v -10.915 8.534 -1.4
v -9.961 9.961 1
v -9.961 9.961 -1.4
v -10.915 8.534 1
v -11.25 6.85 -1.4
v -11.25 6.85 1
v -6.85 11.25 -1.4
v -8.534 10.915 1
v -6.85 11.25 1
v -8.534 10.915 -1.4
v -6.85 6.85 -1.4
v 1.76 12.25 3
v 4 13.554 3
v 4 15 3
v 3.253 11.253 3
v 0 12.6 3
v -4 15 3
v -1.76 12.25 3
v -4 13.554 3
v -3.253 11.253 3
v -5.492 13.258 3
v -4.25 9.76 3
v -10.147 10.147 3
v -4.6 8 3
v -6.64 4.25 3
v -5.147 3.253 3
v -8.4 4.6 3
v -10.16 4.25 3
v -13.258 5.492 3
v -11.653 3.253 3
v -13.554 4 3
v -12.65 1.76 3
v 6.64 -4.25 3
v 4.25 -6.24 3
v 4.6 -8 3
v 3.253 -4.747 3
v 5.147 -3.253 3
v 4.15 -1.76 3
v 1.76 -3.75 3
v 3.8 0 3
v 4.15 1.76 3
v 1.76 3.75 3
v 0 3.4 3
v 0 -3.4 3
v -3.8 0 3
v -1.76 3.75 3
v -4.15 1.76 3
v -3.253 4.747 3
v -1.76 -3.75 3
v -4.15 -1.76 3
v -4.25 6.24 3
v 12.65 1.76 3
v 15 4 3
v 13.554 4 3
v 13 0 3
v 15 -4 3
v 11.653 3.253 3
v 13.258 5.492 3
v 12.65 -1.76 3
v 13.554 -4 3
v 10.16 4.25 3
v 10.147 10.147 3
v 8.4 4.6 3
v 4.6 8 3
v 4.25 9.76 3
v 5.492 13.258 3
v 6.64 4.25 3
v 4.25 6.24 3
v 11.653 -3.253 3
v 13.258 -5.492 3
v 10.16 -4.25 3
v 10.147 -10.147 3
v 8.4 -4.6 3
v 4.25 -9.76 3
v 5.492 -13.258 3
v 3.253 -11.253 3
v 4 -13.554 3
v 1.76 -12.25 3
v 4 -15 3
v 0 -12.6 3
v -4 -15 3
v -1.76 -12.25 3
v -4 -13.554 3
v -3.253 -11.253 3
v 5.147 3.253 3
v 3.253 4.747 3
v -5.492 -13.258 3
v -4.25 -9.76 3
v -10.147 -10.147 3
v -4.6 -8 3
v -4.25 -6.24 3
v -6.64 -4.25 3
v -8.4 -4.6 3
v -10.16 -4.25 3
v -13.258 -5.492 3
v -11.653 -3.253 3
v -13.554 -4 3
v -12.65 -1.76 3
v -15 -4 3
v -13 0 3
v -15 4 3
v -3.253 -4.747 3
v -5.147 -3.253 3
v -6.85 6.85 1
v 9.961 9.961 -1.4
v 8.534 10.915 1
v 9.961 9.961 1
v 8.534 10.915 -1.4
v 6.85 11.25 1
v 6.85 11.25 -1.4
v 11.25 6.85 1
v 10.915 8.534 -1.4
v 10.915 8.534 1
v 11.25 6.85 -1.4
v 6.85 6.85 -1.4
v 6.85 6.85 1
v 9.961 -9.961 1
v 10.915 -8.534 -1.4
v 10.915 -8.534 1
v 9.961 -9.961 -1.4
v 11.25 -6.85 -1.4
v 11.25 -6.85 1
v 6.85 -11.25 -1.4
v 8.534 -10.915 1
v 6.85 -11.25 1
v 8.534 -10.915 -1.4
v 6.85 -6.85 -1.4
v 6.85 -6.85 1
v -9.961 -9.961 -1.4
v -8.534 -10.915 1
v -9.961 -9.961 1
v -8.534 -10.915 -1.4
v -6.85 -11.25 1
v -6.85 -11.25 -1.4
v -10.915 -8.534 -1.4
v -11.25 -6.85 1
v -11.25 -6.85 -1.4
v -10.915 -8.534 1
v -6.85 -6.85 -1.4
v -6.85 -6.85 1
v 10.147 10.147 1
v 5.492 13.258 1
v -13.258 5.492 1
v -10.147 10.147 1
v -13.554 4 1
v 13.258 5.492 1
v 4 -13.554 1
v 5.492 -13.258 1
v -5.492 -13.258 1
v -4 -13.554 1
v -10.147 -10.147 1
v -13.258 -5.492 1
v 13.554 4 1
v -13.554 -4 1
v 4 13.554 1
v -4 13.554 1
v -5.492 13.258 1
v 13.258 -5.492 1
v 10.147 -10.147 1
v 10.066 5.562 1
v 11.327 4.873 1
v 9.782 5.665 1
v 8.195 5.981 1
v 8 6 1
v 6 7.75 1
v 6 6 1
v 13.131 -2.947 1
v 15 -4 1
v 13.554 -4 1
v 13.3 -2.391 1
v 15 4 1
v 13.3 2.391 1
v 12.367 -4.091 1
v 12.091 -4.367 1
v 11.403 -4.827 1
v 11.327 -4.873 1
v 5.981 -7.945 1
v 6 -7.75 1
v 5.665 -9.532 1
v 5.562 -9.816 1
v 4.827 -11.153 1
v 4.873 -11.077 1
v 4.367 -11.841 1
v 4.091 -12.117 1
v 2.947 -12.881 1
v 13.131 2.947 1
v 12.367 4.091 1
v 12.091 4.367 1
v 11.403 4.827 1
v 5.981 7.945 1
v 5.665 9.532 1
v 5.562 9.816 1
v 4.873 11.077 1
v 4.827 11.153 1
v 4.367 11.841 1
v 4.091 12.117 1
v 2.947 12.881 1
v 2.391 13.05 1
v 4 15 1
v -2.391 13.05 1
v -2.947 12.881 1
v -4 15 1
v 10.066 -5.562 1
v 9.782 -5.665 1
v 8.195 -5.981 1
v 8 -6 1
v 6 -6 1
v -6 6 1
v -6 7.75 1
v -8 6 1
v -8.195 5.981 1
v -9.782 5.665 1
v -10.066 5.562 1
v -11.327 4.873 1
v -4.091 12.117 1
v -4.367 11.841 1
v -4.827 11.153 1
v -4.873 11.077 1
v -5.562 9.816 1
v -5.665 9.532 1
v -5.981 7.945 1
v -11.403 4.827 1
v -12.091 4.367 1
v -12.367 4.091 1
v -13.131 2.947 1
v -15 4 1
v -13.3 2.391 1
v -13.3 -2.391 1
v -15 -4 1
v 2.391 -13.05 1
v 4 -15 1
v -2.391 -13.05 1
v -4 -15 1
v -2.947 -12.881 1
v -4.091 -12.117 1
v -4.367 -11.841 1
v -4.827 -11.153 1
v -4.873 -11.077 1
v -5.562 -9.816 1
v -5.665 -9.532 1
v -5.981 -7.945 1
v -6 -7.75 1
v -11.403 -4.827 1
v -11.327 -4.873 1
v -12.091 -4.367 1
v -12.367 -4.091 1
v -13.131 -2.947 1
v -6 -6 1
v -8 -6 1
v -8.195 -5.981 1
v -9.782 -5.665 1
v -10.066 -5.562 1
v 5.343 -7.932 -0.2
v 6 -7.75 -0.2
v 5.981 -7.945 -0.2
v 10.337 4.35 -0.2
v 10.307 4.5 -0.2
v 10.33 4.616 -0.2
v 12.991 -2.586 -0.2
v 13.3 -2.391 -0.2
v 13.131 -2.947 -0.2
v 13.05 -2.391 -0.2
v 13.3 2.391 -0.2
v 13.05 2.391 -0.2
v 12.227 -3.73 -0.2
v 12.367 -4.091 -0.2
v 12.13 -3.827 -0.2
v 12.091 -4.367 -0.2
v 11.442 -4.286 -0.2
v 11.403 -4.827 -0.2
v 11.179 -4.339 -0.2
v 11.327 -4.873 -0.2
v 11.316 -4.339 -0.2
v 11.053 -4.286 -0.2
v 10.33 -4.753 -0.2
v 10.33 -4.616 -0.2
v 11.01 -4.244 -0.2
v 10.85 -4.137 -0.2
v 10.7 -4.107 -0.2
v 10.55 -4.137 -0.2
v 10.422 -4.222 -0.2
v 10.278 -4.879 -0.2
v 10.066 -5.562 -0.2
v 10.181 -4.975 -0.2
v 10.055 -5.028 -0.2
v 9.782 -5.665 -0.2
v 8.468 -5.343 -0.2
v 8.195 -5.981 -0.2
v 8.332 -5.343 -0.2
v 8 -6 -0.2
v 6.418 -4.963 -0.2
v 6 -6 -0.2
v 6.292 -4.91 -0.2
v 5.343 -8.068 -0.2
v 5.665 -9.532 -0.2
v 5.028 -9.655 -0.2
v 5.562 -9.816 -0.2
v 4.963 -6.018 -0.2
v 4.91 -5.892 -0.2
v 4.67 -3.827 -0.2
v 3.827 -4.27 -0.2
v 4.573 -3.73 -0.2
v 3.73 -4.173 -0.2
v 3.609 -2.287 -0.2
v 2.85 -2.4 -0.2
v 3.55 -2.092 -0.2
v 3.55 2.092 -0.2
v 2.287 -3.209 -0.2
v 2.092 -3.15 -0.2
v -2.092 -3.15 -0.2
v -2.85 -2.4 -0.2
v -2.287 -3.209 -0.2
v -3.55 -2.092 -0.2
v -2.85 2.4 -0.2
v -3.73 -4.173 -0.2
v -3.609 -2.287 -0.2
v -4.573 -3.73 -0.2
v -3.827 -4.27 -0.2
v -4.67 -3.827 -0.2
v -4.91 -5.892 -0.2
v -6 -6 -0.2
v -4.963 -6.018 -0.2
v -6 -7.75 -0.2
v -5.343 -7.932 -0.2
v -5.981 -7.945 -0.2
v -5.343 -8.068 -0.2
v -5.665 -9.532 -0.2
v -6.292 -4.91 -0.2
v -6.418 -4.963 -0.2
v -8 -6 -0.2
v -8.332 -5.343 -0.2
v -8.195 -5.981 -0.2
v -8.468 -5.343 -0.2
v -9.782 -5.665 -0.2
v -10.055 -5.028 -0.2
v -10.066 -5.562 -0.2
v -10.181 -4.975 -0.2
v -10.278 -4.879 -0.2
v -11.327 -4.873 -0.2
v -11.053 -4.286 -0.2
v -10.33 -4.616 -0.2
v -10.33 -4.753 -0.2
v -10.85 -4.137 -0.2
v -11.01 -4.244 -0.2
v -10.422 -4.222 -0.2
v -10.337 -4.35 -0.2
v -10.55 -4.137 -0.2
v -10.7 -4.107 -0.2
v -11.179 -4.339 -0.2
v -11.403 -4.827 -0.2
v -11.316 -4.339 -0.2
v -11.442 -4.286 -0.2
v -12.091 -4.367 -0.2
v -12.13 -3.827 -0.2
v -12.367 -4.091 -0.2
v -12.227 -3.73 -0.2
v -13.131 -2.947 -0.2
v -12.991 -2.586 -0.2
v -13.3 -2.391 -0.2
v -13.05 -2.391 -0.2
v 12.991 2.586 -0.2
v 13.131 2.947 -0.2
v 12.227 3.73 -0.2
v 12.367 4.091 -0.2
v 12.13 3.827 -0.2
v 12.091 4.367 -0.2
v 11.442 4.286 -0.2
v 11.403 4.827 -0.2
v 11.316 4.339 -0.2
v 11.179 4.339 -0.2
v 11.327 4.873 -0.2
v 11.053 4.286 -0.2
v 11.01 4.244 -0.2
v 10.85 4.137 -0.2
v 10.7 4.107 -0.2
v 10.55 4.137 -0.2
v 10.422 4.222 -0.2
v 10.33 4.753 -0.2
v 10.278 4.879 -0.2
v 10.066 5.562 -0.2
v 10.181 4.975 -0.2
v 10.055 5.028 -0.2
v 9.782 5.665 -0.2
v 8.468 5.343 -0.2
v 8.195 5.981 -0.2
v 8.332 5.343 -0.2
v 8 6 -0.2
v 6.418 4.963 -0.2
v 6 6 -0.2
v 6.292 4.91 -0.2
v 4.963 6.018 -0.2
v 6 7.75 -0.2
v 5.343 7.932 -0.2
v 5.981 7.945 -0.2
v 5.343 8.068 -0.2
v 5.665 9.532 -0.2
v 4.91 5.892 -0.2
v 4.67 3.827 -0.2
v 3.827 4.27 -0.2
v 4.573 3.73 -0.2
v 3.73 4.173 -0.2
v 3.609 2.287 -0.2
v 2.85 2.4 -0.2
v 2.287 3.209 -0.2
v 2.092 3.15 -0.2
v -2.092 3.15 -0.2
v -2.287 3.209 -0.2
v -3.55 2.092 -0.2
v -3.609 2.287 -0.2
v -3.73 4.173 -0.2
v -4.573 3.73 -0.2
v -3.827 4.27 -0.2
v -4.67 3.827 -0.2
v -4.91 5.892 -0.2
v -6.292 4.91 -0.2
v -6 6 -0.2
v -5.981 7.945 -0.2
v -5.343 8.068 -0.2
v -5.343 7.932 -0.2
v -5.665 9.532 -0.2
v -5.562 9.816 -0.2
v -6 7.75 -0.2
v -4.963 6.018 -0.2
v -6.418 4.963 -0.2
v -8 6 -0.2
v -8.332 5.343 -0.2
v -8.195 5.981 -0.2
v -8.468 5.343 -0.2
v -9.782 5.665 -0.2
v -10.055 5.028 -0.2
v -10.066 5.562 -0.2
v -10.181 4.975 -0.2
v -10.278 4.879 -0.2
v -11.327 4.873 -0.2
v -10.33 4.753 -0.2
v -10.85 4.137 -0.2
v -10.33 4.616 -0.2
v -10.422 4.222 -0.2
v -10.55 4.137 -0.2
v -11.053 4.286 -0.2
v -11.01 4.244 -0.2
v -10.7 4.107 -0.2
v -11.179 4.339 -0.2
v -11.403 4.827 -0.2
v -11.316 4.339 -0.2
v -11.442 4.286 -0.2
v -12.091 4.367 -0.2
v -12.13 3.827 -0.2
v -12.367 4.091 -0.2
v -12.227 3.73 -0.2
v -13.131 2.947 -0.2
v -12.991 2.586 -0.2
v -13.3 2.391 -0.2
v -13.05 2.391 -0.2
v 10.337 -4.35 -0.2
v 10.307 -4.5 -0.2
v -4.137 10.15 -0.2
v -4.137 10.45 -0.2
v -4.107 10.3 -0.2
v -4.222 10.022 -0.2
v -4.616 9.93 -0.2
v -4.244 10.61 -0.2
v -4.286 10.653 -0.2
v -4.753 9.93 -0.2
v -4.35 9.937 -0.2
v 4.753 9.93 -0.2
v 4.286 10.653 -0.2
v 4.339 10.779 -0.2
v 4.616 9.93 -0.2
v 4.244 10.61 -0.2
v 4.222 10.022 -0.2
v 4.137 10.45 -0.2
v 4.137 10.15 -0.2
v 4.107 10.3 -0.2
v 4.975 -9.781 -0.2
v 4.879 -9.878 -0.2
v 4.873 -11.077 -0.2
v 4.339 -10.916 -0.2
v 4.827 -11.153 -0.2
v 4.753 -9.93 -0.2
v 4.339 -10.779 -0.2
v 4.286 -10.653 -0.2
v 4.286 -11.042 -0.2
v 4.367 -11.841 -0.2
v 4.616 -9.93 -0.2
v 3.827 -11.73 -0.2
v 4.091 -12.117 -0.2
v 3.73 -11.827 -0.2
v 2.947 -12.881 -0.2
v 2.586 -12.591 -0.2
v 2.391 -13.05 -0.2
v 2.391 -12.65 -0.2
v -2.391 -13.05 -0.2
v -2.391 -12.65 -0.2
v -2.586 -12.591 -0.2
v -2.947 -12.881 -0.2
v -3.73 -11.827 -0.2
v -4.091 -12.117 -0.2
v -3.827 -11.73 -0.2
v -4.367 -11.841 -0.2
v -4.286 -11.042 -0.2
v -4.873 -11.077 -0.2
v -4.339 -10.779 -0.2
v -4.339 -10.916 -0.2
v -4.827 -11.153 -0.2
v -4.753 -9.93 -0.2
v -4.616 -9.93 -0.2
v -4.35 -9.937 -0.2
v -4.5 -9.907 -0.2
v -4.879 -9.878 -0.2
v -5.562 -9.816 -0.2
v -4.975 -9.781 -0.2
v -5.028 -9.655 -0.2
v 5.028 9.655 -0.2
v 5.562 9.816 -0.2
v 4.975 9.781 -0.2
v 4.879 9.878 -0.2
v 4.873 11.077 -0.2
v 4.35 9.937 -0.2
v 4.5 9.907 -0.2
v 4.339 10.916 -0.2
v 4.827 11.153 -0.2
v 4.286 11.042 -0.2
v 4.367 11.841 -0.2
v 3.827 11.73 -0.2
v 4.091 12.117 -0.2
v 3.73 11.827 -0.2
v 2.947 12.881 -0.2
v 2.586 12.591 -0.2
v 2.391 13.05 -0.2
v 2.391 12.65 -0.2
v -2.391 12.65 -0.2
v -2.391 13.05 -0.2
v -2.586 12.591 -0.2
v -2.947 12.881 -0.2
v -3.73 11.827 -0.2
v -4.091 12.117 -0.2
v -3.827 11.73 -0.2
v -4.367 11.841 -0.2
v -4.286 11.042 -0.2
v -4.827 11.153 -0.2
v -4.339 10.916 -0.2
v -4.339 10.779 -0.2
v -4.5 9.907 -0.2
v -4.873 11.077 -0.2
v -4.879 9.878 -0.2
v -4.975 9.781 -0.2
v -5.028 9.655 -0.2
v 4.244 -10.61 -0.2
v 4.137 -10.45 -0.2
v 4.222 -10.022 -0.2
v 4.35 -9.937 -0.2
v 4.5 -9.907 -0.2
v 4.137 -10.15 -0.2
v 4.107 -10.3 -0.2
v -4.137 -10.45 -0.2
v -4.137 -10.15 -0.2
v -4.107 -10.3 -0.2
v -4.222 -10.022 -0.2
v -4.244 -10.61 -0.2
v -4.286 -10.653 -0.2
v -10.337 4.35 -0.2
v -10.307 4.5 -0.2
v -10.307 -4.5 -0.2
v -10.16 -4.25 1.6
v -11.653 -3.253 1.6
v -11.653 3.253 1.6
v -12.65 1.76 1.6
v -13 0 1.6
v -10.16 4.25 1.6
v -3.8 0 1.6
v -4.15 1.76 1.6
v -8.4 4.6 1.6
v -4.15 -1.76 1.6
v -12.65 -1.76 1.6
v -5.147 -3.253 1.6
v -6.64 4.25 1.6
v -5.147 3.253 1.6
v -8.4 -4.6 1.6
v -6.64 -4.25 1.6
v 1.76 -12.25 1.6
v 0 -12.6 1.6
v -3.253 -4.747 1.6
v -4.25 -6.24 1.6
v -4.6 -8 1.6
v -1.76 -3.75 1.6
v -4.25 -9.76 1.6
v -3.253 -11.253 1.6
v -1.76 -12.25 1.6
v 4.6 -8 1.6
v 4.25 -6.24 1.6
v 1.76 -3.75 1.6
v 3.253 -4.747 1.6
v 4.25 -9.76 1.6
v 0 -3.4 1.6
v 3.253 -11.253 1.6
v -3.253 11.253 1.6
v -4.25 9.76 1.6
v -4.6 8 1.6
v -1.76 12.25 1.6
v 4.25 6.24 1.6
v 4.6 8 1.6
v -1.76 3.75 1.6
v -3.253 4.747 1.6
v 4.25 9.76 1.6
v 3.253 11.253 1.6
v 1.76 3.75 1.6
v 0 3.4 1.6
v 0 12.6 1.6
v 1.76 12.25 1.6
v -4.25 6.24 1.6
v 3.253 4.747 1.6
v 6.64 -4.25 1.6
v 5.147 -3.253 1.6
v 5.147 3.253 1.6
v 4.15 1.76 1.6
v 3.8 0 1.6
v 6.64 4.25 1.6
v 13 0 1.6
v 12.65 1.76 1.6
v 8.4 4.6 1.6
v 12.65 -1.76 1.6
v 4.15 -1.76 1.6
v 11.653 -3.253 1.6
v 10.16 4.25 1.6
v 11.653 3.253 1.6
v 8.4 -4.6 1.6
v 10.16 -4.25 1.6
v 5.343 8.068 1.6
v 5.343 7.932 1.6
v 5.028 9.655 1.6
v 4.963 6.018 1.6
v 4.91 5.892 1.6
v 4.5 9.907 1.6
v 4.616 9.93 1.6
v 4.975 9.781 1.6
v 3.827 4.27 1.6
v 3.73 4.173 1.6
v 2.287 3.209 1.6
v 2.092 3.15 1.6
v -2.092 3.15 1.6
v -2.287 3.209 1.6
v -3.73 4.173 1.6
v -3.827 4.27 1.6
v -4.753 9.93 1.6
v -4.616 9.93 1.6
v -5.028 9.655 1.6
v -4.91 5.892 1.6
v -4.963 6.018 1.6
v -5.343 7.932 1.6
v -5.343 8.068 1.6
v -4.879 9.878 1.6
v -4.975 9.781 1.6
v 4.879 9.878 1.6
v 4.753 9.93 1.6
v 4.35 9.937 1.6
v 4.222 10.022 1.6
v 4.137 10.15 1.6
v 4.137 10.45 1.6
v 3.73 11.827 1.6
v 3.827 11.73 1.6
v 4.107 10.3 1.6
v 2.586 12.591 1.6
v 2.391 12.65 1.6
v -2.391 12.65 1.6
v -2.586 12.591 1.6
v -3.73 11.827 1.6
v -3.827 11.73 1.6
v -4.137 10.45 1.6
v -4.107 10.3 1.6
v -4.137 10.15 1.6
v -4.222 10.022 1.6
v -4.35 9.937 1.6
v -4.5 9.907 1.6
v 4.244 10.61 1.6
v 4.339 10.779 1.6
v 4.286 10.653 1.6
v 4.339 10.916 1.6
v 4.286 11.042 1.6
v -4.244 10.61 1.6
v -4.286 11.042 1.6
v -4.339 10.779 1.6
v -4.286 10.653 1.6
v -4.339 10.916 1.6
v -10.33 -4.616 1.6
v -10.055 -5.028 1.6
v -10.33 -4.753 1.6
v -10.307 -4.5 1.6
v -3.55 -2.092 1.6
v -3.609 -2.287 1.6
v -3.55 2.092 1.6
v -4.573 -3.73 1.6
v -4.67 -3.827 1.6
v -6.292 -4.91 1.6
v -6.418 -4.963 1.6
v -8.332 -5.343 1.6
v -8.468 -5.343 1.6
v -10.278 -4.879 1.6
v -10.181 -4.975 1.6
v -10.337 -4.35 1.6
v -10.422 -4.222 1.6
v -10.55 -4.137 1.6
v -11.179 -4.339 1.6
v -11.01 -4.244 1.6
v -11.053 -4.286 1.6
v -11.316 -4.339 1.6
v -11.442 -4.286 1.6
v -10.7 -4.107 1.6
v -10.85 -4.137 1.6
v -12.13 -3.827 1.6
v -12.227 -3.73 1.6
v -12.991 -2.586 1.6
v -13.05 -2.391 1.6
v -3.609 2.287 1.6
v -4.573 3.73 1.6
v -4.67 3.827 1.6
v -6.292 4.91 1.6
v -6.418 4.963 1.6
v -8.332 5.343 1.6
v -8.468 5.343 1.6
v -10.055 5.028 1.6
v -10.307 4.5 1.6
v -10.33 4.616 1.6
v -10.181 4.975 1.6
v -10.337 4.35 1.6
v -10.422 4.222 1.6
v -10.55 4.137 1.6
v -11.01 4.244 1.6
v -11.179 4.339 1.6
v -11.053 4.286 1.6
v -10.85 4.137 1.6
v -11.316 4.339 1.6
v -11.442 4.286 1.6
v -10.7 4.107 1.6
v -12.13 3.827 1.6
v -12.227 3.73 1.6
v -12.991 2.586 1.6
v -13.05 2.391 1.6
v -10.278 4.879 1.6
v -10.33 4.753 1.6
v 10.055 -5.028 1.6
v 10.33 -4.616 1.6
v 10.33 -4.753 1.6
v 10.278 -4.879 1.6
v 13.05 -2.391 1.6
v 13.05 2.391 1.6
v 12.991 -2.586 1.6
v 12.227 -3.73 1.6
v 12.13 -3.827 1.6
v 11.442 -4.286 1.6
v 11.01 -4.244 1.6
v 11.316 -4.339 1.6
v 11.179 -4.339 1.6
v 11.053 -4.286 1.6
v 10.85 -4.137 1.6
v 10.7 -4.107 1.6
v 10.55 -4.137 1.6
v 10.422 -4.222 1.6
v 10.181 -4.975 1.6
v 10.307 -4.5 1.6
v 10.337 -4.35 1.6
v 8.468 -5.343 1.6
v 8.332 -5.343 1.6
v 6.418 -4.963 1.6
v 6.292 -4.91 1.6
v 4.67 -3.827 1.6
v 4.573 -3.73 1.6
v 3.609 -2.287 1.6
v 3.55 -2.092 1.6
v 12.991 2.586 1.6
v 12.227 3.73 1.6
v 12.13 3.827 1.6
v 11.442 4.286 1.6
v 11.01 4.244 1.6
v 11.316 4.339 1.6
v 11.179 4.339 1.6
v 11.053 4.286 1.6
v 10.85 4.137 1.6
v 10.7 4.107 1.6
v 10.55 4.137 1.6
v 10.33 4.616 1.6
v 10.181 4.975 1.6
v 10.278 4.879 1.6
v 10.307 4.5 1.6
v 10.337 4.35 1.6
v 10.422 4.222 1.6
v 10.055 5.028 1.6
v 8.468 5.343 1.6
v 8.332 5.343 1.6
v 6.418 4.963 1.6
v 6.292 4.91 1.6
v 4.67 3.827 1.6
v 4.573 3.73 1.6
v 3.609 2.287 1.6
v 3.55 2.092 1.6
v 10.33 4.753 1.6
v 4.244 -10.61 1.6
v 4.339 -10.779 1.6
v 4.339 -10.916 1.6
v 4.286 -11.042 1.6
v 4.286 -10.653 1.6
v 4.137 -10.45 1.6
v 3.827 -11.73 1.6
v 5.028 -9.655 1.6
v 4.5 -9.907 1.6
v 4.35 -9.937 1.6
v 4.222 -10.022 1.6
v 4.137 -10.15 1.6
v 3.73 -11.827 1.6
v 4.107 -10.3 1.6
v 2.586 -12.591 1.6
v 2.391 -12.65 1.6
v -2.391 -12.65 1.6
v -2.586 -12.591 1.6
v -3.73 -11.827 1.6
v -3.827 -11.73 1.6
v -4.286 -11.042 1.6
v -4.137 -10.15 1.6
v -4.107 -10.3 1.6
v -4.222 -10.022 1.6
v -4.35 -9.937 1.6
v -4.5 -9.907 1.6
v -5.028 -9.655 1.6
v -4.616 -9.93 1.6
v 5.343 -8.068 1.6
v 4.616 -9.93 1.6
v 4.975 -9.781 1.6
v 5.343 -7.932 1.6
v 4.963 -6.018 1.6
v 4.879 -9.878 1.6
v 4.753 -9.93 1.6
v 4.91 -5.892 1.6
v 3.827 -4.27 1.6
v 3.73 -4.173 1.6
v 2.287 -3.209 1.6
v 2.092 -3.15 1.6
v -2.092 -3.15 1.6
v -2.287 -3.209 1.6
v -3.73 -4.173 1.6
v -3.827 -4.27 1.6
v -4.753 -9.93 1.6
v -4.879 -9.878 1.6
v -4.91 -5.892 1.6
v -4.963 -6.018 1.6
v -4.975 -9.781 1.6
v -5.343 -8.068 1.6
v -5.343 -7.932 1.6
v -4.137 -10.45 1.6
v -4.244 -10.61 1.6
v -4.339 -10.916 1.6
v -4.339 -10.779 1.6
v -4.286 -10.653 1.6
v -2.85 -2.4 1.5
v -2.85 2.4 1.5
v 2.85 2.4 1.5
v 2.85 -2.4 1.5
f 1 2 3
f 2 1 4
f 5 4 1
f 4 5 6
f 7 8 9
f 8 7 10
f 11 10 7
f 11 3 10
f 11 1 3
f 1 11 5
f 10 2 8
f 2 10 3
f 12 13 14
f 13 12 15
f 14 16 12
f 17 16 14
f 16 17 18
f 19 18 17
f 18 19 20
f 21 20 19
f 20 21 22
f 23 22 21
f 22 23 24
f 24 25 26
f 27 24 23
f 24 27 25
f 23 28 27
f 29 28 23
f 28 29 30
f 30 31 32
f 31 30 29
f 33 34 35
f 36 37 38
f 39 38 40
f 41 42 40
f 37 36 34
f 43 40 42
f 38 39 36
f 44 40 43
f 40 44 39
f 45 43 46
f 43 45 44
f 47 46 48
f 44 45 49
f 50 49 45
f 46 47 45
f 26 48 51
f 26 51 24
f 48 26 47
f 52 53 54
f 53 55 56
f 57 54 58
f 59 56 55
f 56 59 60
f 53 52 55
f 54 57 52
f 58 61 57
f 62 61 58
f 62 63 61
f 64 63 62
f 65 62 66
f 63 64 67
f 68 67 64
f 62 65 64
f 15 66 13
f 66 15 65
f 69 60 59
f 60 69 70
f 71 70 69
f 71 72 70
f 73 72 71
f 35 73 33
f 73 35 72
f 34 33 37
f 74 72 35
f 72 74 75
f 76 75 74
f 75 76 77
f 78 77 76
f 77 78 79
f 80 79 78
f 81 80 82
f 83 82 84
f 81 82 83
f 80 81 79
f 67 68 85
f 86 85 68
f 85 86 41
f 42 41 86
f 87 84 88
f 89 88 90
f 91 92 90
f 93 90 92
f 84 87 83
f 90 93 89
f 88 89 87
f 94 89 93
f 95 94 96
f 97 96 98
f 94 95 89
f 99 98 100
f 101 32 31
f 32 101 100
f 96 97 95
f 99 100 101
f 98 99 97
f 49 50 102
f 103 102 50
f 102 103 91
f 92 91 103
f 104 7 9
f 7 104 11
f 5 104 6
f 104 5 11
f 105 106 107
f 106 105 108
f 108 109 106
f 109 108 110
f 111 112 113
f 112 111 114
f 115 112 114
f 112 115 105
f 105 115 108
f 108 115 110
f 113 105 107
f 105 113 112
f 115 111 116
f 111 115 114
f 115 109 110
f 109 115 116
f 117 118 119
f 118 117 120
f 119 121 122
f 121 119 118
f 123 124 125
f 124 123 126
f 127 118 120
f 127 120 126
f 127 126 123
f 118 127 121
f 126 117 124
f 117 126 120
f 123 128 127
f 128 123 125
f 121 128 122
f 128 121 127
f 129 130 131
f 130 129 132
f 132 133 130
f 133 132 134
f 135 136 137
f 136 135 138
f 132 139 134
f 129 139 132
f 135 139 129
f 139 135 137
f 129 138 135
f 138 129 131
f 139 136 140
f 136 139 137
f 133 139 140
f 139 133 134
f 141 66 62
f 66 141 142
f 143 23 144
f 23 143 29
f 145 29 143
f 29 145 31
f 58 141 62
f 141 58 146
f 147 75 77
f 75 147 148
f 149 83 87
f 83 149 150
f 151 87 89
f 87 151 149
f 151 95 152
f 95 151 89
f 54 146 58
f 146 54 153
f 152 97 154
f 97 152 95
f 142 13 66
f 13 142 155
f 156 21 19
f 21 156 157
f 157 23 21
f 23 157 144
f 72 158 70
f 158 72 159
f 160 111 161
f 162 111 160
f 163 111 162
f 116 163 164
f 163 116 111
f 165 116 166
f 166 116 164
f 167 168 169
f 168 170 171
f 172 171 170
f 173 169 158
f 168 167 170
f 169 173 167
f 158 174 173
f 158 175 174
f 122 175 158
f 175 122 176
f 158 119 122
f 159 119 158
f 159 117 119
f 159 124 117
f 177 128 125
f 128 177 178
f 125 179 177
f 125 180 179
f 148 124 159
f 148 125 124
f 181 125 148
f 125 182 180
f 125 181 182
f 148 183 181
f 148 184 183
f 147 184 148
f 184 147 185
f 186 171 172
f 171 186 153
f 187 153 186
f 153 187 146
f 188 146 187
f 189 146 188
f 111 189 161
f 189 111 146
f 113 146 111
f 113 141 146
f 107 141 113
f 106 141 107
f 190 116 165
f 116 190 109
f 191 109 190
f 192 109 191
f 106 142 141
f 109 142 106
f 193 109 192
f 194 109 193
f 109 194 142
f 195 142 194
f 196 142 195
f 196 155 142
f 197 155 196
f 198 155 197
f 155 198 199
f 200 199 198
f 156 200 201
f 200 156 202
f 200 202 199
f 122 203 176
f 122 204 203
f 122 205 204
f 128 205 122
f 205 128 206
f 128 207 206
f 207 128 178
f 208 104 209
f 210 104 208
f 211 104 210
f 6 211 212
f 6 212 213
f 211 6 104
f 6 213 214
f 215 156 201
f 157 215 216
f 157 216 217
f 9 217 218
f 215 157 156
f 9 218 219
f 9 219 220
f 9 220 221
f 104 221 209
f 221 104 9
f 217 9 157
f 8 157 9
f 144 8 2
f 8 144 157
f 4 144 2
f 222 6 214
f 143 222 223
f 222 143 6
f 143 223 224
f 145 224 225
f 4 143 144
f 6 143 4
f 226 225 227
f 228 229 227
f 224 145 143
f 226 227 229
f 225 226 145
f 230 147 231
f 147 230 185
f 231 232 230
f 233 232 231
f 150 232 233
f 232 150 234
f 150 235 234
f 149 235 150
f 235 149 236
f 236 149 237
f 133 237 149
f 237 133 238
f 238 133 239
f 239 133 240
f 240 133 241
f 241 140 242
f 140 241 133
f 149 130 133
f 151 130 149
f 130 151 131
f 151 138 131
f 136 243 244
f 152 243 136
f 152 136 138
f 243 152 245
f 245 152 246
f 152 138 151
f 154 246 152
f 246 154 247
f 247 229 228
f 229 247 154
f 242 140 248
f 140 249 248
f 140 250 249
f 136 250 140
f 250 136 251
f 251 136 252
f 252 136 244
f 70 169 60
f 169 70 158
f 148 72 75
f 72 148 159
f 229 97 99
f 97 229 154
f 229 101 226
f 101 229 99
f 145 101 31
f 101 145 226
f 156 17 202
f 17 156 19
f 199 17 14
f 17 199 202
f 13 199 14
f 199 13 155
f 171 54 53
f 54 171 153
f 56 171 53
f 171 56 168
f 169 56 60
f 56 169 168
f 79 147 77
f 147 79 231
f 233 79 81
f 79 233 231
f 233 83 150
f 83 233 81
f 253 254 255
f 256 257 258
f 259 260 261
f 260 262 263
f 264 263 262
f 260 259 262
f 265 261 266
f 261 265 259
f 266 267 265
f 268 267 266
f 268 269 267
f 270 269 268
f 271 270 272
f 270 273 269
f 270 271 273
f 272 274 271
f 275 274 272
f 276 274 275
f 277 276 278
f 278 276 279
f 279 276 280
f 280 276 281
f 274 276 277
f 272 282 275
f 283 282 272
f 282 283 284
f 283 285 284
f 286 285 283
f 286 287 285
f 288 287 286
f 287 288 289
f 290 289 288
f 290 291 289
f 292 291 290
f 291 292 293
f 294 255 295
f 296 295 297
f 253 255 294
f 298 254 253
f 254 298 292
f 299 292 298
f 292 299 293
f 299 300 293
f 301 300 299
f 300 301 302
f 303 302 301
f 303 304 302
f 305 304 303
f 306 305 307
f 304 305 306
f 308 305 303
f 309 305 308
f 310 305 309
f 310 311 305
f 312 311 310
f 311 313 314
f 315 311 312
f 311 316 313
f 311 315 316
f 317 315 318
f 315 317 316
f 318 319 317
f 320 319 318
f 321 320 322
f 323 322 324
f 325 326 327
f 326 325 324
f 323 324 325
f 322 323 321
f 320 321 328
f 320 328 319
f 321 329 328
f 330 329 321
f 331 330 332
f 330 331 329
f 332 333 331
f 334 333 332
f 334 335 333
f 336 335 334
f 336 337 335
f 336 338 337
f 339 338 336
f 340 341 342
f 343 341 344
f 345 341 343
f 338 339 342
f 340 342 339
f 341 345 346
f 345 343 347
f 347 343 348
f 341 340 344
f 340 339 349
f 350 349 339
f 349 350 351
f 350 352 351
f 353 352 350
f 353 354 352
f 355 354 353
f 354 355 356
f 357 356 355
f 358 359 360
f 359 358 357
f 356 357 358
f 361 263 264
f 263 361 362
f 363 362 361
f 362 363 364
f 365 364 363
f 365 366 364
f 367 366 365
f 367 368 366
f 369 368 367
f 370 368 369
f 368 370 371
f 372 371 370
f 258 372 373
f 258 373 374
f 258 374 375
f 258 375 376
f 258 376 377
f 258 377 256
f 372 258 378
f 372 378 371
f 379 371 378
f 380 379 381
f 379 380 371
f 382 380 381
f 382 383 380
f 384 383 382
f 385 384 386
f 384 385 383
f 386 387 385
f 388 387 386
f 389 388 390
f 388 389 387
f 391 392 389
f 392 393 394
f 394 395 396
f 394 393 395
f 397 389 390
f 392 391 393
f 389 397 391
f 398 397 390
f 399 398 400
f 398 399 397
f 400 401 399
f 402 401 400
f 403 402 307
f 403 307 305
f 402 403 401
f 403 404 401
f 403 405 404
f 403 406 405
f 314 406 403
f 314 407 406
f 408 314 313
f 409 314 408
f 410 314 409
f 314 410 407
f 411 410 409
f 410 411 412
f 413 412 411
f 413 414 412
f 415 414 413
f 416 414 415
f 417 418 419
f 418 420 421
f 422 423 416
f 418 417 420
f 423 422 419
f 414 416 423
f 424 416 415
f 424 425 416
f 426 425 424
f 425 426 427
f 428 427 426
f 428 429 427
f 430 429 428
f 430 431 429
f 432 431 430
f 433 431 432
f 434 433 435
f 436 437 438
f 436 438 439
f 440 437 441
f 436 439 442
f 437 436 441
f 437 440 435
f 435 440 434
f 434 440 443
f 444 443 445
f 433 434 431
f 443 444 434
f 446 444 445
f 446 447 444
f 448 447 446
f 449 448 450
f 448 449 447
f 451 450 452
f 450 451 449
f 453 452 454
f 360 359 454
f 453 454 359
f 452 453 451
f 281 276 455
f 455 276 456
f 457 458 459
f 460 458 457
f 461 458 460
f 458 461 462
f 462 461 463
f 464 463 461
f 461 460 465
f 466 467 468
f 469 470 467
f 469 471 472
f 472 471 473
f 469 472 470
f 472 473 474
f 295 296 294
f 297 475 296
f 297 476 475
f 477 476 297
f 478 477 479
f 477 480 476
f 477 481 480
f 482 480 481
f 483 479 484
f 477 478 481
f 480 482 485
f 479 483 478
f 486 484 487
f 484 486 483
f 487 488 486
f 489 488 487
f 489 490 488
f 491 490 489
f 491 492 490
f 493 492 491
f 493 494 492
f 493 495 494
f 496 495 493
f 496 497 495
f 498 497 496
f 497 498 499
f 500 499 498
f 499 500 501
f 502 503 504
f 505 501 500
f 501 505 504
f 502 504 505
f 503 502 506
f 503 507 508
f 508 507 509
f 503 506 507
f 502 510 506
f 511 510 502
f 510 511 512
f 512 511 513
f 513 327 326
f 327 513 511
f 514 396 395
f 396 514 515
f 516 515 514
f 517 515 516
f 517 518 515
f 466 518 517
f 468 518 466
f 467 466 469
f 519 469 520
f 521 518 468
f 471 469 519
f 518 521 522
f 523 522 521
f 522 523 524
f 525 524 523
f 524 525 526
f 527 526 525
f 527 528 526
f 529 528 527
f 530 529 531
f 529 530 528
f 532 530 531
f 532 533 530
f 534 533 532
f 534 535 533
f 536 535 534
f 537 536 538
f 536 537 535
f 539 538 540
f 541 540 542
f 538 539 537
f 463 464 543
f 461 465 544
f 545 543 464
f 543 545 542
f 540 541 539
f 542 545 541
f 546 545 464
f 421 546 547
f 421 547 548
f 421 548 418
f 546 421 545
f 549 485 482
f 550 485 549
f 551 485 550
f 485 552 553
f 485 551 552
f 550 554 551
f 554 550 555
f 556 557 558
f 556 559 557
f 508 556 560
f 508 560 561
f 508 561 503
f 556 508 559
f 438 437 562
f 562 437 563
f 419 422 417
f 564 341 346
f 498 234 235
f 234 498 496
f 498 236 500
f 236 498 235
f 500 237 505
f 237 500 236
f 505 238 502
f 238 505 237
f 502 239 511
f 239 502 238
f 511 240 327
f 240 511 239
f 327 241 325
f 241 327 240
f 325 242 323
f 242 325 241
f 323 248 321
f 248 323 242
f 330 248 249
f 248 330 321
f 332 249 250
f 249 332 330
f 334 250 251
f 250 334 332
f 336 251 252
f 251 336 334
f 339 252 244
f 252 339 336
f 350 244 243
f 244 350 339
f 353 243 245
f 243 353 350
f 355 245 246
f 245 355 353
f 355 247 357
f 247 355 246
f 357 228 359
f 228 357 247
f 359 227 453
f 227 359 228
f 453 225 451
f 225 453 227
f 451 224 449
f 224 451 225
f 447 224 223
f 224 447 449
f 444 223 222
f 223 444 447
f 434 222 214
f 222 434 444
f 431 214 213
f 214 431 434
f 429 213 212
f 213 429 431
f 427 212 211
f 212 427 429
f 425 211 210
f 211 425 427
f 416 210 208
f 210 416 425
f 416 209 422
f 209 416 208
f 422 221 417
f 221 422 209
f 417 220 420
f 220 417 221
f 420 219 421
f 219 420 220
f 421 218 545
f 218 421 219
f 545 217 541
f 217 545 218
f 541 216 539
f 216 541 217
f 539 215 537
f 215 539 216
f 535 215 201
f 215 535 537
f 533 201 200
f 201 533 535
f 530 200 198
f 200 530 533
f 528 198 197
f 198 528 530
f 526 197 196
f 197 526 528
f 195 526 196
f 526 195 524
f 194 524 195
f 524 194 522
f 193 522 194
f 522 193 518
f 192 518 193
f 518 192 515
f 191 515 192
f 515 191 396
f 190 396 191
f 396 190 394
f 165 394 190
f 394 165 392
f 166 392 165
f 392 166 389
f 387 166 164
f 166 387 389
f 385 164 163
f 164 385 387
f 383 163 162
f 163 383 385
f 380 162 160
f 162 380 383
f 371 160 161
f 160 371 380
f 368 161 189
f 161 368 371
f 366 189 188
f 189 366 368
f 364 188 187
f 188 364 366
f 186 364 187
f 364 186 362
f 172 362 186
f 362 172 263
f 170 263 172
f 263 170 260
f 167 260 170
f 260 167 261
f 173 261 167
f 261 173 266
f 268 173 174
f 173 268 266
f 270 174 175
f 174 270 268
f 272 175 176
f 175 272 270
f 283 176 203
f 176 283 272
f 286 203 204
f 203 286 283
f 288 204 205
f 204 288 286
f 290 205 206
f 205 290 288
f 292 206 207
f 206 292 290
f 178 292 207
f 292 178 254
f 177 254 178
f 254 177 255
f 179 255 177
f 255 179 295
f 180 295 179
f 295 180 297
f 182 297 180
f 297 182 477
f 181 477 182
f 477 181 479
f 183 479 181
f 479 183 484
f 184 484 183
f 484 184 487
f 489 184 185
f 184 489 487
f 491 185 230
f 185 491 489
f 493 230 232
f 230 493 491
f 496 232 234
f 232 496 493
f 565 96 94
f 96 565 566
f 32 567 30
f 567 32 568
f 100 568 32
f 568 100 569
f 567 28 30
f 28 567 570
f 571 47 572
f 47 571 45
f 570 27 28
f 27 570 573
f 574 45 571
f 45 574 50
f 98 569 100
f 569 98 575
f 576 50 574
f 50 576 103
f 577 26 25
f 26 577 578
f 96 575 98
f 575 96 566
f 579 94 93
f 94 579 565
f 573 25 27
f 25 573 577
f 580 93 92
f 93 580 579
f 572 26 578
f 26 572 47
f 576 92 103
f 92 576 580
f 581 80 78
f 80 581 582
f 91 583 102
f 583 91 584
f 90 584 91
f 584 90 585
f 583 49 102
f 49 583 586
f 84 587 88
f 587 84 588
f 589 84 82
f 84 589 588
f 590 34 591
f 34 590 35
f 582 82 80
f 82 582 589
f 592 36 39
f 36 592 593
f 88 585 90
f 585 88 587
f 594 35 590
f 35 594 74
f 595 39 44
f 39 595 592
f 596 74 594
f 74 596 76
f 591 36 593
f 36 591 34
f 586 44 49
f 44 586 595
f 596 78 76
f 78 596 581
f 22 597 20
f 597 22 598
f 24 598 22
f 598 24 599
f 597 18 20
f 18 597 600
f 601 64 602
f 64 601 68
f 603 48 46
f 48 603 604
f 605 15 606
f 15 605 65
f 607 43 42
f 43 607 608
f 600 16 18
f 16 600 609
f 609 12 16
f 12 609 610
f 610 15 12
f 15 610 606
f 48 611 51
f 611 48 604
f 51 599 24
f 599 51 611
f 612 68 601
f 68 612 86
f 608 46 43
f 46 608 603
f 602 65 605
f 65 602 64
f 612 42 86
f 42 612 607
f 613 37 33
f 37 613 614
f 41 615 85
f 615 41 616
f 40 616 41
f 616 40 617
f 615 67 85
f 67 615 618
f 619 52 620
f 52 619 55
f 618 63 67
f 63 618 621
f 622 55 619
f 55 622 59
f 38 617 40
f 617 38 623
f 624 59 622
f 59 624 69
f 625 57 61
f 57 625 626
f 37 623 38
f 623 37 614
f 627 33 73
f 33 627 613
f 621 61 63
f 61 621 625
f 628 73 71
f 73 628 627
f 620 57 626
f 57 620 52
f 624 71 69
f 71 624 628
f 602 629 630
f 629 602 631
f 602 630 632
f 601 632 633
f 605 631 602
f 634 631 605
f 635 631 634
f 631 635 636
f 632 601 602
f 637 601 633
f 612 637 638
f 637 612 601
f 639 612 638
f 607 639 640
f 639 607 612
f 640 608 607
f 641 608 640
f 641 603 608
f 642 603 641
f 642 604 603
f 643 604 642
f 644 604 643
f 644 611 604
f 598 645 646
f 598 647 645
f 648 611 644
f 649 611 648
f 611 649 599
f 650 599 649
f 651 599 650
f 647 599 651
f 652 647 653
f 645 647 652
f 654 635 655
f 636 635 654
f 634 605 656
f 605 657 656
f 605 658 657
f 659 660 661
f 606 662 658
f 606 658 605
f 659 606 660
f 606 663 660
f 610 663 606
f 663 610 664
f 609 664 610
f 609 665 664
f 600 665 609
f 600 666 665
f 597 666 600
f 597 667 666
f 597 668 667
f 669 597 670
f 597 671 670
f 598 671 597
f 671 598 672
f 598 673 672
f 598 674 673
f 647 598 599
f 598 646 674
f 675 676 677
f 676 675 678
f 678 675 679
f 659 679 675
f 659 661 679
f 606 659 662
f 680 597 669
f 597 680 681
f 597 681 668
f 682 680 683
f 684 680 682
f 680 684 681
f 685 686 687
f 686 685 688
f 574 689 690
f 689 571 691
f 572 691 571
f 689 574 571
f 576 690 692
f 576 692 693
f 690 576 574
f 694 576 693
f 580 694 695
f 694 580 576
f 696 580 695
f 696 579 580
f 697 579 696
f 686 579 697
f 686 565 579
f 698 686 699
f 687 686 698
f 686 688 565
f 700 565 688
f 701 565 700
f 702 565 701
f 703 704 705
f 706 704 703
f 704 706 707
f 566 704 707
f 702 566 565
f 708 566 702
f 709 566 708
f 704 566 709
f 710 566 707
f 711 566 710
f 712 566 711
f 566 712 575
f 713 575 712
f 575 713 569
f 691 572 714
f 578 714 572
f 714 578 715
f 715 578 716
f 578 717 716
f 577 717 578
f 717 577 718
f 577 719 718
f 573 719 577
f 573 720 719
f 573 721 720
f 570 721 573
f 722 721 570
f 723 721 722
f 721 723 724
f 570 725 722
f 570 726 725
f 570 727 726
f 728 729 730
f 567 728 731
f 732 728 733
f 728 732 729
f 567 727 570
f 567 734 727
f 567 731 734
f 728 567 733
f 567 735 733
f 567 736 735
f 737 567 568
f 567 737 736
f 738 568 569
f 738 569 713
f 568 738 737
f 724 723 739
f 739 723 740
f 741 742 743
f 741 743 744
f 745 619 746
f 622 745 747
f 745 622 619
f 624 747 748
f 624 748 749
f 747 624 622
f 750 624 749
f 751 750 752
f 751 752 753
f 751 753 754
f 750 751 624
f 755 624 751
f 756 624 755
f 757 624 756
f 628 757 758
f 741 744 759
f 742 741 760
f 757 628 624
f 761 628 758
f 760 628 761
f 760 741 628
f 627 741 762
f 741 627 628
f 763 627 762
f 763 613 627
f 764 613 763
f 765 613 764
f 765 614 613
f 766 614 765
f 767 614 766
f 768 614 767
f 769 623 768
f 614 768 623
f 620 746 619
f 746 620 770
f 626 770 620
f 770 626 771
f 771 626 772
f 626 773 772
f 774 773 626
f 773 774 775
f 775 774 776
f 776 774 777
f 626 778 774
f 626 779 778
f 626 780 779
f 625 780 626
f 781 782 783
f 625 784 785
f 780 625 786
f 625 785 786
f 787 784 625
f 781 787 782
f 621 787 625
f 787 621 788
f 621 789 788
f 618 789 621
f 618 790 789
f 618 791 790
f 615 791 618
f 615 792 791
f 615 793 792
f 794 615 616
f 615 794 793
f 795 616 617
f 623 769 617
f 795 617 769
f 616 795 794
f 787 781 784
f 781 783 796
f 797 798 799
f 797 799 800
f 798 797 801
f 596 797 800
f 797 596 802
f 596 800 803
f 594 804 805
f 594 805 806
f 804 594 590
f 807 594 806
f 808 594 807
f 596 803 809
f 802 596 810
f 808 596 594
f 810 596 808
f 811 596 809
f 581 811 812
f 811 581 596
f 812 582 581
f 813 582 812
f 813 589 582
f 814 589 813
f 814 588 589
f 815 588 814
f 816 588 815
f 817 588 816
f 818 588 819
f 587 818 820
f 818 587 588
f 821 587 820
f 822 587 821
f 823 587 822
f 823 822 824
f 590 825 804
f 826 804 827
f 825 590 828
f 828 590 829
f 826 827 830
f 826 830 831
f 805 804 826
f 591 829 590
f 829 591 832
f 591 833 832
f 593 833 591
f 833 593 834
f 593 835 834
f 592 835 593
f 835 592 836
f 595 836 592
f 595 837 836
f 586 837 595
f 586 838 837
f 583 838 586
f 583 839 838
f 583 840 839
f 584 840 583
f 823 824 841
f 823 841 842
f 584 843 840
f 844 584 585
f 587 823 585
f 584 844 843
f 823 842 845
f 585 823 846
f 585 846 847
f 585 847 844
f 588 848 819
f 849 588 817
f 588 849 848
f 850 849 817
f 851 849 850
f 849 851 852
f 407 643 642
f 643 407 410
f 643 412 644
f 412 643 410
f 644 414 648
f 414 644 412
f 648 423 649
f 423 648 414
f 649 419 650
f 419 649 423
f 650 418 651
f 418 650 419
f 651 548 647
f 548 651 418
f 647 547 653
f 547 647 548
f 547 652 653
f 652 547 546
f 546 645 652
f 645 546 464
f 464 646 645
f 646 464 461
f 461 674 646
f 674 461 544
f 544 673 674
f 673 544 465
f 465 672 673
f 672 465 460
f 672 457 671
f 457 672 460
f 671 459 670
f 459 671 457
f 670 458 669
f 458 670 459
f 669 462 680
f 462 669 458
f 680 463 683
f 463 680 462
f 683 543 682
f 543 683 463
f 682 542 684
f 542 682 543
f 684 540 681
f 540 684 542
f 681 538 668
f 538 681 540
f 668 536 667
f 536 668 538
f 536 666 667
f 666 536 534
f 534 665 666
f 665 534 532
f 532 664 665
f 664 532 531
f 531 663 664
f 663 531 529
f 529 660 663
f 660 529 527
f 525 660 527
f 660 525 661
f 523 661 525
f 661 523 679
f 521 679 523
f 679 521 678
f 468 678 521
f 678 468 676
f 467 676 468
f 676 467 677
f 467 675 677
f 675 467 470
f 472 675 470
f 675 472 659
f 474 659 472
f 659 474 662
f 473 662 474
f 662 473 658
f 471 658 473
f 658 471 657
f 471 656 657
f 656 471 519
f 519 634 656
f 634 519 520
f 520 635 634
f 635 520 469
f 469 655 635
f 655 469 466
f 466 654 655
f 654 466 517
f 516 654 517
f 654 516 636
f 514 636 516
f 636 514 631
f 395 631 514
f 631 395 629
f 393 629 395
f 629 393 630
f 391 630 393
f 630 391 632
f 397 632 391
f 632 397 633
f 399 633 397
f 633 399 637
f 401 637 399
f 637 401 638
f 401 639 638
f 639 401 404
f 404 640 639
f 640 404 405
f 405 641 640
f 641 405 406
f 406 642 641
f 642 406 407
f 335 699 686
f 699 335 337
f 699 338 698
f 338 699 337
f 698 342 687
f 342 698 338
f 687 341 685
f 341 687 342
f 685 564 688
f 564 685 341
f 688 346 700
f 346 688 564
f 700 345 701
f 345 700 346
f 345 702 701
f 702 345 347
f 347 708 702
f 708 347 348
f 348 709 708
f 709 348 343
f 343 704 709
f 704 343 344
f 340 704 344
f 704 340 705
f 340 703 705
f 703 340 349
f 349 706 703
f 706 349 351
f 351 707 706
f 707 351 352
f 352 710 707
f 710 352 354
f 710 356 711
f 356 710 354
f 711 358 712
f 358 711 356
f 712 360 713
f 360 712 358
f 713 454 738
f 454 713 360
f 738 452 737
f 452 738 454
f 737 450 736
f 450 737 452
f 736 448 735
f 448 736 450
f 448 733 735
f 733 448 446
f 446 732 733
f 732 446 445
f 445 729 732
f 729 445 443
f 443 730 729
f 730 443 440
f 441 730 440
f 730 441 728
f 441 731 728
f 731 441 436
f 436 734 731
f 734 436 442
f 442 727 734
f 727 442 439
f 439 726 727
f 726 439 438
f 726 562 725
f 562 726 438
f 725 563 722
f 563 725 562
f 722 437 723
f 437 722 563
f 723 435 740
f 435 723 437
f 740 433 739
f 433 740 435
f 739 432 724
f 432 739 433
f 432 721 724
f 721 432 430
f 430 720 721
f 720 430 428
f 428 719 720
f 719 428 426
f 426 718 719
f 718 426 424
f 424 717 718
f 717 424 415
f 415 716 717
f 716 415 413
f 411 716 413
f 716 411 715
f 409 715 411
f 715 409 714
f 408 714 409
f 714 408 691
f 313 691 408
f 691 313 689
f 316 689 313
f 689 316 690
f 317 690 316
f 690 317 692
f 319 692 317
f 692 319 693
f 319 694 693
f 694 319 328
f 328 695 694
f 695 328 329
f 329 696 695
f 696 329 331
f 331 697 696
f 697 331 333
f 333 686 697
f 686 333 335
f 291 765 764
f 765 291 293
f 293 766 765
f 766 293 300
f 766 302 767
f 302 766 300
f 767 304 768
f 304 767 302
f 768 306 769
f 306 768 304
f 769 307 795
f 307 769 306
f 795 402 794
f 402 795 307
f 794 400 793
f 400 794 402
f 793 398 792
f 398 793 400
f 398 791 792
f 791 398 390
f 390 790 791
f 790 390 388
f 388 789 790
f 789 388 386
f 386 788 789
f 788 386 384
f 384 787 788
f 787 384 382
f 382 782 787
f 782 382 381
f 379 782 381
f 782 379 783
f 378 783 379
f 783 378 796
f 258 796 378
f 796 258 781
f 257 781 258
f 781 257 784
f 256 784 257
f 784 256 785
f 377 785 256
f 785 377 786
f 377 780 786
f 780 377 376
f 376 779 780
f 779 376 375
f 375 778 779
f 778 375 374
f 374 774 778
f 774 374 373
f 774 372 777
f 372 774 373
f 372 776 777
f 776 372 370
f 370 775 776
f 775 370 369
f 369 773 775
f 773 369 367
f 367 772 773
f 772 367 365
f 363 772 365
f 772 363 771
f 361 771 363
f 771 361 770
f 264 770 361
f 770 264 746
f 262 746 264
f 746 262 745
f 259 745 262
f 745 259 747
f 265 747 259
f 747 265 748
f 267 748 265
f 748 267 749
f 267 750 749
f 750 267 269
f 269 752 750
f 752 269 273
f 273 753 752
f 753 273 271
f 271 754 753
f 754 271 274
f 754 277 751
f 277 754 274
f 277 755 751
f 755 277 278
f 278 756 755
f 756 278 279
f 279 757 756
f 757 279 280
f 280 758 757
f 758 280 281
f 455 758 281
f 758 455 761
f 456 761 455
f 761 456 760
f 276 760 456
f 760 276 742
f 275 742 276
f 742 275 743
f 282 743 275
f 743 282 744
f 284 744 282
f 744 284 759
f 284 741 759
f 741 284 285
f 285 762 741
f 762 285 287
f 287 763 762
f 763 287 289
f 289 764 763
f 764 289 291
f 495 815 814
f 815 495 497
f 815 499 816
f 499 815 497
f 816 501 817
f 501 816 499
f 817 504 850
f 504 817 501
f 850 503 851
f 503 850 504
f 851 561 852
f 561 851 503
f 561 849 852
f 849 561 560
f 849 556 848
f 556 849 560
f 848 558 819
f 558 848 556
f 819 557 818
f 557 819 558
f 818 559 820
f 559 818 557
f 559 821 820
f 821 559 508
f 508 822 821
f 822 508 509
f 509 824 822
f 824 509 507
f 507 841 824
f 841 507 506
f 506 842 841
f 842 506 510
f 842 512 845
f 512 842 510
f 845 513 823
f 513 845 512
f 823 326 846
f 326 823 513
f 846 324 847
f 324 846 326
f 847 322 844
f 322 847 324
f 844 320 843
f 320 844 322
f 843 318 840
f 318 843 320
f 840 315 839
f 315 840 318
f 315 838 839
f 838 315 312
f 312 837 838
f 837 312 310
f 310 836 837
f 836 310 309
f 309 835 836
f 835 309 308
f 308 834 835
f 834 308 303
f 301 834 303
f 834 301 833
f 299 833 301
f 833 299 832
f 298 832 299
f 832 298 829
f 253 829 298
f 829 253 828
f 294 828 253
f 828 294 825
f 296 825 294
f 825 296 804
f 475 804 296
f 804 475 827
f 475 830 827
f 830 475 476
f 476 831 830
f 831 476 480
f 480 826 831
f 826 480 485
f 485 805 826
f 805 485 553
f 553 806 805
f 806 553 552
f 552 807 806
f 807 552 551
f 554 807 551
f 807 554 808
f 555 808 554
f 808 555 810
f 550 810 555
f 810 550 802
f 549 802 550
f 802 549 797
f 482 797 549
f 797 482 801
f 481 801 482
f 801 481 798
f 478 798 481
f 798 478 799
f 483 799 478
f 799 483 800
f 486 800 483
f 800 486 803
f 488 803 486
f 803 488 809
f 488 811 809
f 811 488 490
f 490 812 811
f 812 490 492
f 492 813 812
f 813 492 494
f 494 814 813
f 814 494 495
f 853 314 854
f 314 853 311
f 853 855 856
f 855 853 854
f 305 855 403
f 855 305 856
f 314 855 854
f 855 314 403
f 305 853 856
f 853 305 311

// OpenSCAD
// file: common.scad
// Copyright 2019 a.j.buxton@gmail.com
// CC BY-NC-ND 4.0

w = 150.5;
h = 65;


// abxy and dpad holes
button_hole_diameter = 29;
// analog stick
analog_hole_diameter = 22.5;

button_radius = 8.4/2;
button_height = 4.5;

button_letters = ["A", "B", "X", "Y"];
button_rotations = [180, 90, 270, 0];
button_colours = [[1.0, 0.1, 0.1], [1, 0.8, 0], [0.1, 0.3, 1], [0, 0.8, 0]];


small_button_radius = 5.2/2;
small_button_letters = ["H", "M"];
small_button_rotations = [180, 0];


module twobytwo() {
    children();
    rotate(90) children();
    rotate(180) children();
    rotate(270) children();
}

module base_insert(thickness) {
    cylinder(d=button_hole_diameter-0.3, h=thickness);
    linear_extrude(height=thickness, convexity=2) {
        square([8, 30], center=true);
        square([30, 8], center=true);
    }
    twobytwo() translate([6.85, 6.85, 0]) intersection() {
        cylinder(r=4.4, h=4.4);
        cube(10);
    }
}

module outline() {
    offset(5) offset(-5) square([w, h], center=true);
}


module shell(height=7.6) {
    difference() {
        linear_extrude(height=height, convexity=2) difference() {
            offset(1.6) outline();
            outline();

        }
    }
}


module dpad_pos() {
    translate([(w/2)-17.5, -9]) children();
}

module analog_pos() {
    translate([(w/2)-16.75, 21.25]) children();
}

module btn_pos() {
    translate([18.7-(w/2), 10.4]) children();
}

module smlbtn_pos() {
    translate([18.7-(w/2), -17.5]) children();
}

module led_pos() {
    translate([-48.75, 30]) children();
    translate([-56.75, 30]) children();
    translate([-64.75, 30]) children();
}

module screw_pos(internal=true) {
    translate([0, 0.2, 0]) {
        translate([143.5/2, 0]) {
            translate([0, -29]) children();
            if (internal) translate([0, 0]) children();
            translate([0, 29]) children();
            if (internal) translate([-30, 0]) {
                //translate([0, -29]) children();
                translate([0, 0]) children();
                translate([0, 29]) children();
            }
        }
        translate([-144.5/2, 0]) {
            translate([0, -29]) children();
            if (internal) translate([0, 0]) children();
            translate([0, 29]) children();
            if (internal) translate([30, 0]) {
                translate([0, -29]) children();
                //translate([0, 0]) children();
                translate([0, 29]) children();
            }
        }
    }
}


// TODO: Remove these
// main file
// Copyright 2019 a.j.buxton@gmail.com
// CC BY-NC-ND 4.0

include <common.scad>;



module button_positions() {
    positions = [[16.8/2, 0], [0, -16/2], [0, 16/2],   [-16.8/2, 0]];
    for($which = [0:3]) translate(positions[$which]) children();
}


module rubber() {
    positions = [[16/2, 0], [0, -15.5/2], [0, 15.5/2],   [-16/2, 0]];
    hull() {
        for($which = [0, 3]) translate(positions[$which]) children();
    }
    hull() {
        for($which = [1, 2]) translate(positions[$which]) children();
    }

}



module button_base() {

    difference() {
        circle(d=10);
        rotate(button_rotations[$which]) {
            translate([9.5, 0, 0]) square(10, center=true);
            translate([-9.3, 0, 0]) square(10, center=true);

            translate([-2.3, 0, 0]) {
                    translate([0, 4.5, 0]) circle(d=1.5);
                    translate([0, -4.5, 0]) circle(d=1.5);
            }
        }
    }

}


module text_offset(amt) {
    offset(amt) offset(amt) offset(-amt) children();
}


module button_top(r, label="?") {
    difference() {
        scale([1, 1, 0.25]) sphere(r=r);
        translate([0, 0, r*0.10]) linear_extrude(height=10, convexity=4) text_offset(0.15*r/button_radius) text(label, size=4*r/button_radius, halign="center", valign="center");
    }
}


module button() {
    color(button_colours[$which]) {
        union() {
            linear_extrude(height=1.2) button_base();
            cylinder(r=button_radius, h=button_height);
            translate([0, 0, button_height-0.0]) button_top(button_radius, button_letters[$which]);
        }
    }
}

module buttons() {
    button_positions() button();
}


module button_insert() {
    front_thickness = 2;
    difference() {
        union() {
            base_insert(front_thickness);
            translate([0, 0, front_thickness]) linear_extrude(height=1.2, convexity=2) offset(1) rubber() button_base();

        }

        translate([0, 0, -0.1]) button_positions() cylinder(r=button_radius+0.4, h=10);
        translate([0, 0, 1.4]) {
            linear_extrude(height=10, convexity=4) button_positions() offset(0.35) button_base();
            translate([0, 0, 1.6]) cube([5.7, 4.8, 3], center=true);
        }
    }
}



RES = undef;

$fn = RES ? RES : 16;


WHICH = undef;
if (WHICH == "A") {
    button($which = 0);
}
else if (WHICH == "B") {
    button($which = 1);
}
else if (WHICH == "X") {
    button($which = 2);
}
else if (WHICH == "Y") {
    button($which = 3);
}
else if (WHICH == "insert") {
    button_insert();
}
else if (1) {
    translate([0, 0, 3]) rotate([0, 180, 0]) button_insert();
    //button_positions() button();
}
